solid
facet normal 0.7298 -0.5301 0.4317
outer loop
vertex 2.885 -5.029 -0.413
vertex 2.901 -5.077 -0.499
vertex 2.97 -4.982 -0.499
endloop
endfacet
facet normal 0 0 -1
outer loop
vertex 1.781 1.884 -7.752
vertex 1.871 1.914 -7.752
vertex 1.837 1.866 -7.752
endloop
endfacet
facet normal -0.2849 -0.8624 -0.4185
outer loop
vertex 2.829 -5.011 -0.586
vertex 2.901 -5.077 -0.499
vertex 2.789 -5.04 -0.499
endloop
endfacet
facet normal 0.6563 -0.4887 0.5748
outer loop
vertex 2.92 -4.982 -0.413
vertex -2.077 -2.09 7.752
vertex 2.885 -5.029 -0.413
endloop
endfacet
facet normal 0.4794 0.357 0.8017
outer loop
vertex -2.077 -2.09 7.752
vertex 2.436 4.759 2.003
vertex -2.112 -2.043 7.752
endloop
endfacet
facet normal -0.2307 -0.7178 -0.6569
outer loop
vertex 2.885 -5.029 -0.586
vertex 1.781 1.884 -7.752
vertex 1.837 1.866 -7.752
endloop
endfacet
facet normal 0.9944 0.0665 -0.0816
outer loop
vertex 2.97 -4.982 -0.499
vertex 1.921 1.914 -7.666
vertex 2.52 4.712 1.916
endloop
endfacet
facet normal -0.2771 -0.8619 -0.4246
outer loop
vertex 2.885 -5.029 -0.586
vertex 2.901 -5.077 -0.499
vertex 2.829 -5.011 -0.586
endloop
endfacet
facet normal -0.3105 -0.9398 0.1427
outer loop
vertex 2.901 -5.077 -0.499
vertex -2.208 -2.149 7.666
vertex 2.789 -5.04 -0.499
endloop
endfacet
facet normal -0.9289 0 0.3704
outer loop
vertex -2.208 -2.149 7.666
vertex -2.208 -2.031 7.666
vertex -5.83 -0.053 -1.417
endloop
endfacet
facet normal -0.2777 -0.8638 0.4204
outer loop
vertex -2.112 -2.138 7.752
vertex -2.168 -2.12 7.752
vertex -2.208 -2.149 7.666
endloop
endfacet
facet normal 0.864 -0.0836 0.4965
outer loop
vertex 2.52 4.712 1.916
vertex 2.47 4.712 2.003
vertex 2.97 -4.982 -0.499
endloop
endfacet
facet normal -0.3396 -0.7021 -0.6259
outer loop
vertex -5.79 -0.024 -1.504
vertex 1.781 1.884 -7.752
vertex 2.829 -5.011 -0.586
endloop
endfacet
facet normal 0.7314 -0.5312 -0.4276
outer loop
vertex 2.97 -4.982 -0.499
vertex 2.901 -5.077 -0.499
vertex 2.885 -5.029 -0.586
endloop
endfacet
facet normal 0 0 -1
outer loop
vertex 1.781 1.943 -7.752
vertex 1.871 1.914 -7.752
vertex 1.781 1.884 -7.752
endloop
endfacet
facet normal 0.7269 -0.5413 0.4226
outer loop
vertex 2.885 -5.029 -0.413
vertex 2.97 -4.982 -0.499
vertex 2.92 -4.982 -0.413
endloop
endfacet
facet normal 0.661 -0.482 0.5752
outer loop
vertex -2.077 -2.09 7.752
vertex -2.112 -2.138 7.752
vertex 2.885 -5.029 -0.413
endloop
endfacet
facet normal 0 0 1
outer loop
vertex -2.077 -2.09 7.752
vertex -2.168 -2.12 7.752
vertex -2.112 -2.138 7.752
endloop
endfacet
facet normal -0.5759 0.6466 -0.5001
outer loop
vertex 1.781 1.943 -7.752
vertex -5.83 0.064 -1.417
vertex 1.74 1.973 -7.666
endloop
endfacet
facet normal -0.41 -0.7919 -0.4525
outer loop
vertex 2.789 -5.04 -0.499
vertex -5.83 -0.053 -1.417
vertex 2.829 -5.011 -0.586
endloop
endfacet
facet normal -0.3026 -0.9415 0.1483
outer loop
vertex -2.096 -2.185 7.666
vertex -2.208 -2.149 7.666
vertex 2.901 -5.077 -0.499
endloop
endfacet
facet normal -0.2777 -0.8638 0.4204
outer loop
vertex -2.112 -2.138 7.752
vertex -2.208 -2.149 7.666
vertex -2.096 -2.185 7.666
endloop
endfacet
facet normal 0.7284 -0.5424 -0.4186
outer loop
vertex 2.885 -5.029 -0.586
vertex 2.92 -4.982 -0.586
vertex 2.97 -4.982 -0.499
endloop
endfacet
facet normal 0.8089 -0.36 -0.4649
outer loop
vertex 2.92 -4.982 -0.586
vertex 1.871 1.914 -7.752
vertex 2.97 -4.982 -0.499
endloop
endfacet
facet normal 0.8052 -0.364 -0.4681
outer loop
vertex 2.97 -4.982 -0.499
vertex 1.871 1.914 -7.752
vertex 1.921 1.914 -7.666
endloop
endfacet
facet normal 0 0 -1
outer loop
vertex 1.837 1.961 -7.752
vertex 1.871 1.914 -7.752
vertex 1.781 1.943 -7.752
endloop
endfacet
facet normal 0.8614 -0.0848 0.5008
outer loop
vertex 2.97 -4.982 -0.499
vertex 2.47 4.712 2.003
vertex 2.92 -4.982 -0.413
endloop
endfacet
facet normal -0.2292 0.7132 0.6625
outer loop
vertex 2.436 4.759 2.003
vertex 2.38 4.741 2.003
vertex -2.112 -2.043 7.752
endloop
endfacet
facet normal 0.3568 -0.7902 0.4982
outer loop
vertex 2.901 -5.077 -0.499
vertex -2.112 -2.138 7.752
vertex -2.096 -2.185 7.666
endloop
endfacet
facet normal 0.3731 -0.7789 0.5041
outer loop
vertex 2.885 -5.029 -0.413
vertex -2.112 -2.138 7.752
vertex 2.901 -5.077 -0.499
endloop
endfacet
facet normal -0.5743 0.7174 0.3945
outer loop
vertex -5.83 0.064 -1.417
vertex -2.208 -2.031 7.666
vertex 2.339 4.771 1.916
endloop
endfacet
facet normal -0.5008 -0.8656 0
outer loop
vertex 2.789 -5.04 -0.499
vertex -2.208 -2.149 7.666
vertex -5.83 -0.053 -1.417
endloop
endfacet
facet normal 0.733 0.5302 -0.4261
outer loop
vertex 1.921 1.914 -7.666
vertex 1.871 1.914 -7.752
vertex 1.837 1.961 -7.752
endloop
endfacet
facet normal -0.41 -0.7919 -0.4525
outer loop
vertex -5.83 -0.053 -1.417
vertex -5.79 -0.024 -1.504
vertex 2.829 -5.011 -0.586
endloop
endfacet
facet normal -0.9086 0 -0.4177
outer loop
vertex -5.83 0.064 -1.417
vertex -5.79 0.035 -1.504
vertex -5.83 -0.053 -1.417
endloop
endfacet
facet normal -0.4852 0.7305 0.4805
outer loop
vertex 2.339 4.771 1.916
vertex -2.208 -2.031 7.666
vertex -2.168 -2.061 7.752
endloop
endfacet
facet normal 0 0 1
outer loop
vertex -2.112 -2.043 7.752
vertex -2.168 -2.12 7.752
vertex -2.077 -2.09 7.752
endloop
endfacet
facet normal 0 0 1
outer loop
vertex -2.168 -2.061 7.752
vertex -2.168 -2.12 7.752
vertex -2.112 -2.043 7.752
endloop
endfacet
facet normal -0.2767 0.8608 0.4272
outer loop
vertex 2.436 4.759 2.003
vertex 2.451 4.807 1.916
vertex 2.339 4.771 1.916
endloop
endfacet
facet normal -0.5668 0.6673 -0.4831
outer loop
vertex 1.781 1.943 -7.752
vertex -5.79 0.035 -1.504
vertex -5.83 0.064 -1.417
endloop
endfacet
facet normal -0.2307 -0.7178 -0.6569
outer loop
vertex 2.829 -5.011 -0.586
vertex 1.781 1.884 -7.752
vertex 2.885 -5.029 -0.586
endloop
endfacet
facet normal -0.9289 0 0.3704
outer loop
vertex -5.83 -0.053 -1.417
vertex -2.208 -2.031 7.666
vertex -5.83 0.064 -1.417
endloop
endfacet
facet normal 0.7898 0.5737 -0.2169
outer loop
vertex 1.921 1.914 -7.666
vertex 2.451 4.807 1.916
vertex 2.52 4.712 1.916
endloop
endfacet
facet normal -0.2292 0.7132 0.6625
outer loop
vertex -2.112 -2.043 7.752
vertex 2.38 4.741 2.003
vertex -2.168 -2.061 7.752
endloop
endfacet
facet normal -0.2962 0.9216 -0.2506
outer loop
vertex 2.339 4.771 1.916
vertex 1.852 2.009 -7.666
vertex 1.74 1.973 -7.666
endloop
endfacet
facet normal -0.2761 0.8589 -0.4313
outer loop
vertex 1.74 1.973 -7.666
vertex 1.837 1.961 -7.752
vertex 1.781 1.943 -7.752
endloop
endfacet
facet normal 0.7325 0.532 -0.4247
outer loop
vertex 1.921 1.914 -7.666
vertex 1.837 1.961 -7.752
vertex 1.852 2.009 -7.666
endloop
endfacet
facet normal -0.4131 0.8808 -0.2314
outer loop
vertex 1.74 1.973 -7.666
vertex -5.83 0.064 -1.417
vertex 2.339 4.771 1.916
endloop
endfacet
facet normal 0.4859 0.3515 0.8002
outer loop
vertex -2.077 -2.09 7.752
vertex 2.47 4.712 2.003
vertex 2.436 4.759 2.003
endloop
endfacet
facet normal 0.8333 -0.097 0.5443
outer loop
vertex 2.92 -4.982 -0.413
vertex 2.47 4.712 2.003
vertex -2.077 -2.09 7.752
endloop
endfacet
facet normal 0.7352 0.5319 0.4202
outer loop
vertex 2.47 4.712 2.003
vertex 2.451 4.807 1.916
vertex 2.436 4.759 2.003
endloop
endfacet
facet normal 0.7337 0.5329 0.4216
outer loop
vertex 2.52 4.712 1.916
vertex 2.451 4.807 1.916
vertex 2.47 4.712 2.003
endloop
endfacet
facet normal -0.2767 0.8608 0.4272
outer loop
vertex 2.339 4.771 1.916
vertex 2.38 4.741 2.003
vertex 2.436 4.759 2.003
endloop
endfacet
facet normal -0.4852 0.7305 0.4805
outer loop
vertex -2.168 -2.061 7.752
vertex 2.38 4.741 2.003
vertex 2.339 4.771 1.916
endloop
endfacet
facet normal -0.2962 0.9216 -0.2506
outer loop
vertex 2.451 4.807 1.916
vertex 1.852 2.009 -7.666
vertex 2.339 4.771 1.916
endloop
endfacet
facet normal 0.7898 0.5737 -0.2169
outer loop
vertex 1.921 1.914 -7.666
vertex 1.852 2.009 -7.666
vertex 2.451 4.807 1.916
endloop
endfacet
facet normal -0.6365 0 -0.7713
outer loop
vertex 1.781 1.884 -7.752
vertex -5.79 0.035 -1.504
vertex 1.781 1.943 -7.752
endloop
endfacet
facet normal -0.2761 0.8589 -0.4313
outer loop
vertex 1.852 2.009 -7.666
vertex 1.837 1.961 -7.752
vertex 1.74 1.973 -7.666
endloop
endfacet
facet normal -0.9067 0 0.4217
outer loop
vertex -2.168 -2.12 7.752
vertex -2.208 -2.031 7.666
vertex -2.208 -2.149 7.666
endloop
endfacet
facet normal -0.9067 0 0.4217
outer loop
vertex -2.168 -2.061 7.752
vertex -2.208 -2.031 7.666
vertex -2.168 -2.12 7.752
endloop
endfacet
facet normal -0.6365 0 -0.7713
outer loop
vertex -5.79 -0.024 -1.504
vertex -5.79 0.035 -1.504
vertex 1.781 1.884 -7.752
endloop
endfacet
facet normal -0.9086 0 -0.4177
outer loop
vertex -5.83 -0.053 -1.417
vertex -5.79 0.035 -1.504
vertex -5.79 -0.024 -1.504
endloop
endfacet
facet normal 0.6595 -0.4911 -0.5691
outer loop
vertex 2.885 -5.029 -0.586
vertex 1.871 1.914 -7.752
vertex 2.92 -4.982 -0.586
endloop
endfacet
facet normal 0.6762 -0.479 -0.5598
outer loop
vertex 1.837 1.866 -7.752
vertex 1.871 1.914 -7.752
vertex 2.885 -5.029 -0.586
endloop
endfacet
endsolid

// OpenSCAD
// Auto-generated OpenSCAD file

    inner_points = 10*[[0.1821393068757838, 0.1913870506433806, -0.766553282190714], [-0.21273894850983668, -0.20901536236239762, 0.766553282190714], [-0.5749142746609799, 0.0005416474787896391, -0.14169497283306184], [0.24202588352164686, 0.471177062130277, 0.19163832047015342], [0.2869889286882537, -0.4981611771875922, -0.0499433476370916]];

    outer_points = 10*[[-0.0010710062446377955, -0.001087881755346909, 0.8164951537673552], [0.0010710062446377955, 0.001087881755346909, -0.8164951537673552], [-0.5773495172173777, 0.0005439408776734544, -0.0007565913797176194], [0.2882045658240988, -0.5002713047271171, -0.0002885101452453076], [0.2891449513932788, 0.49972736384944366, 0.001045101524962927]];

    // Convex hull for inner set (I)
    module inner_hull() {
        hull() {
            for (p = inner_points) {
                translate(p) sphere(r=0.1);
            }
        }
    }

    // Convex hull for outer set (O) minus inner hull (O \ I)
    module outer_minus_inner() {
        difference() {
            hull() {
                for (p = outer_points) {
                    translate(p) sphere(r=0.1);
                }
            }
            inner_hull(); // Subtract inner hull
        }
    }

    // Convex hull for outer set (O) minus all translated inner hulls
    module outer_minus_AllTranslationInner() {
        difference() {
            hull() {
                for (p = outer_points) {
                    translate(p) sphere(r=0.1);
                }
            }
            hull() {
                translate([0,0,50]) inner_hull();
                translate([0,0,-50]) inner_hull();
            }; // Subtract translated inner hulls
        }
    }

    // Difference between outer_minus_inner and outer_minus_AllTranslationInner
    module outer_minus_inner_diff() {
        difference() {
            // Outer minus inner
            difference() {
                hull() {
                    for (p = outer_points) {
                        translate(p) sphere(r=0.1);
                    }
                }
                inner_hull();
            }

            // Subtract Outer minus AllTranslationInner
            difference() {
                hull() {
                    for (p = outer_points) {
                        translate(p) sphere(r=0.1);
                    }
                }
                hull() {
                    translate([0,0,50]) inner_hull();
                    translate([0,0,-50]) inner_hull();
                };
            }
        }
    }

    // Rendering all with colors applied
    color([1, 0, 0, 0.5]) inner_hull(); // Transparent red
    
